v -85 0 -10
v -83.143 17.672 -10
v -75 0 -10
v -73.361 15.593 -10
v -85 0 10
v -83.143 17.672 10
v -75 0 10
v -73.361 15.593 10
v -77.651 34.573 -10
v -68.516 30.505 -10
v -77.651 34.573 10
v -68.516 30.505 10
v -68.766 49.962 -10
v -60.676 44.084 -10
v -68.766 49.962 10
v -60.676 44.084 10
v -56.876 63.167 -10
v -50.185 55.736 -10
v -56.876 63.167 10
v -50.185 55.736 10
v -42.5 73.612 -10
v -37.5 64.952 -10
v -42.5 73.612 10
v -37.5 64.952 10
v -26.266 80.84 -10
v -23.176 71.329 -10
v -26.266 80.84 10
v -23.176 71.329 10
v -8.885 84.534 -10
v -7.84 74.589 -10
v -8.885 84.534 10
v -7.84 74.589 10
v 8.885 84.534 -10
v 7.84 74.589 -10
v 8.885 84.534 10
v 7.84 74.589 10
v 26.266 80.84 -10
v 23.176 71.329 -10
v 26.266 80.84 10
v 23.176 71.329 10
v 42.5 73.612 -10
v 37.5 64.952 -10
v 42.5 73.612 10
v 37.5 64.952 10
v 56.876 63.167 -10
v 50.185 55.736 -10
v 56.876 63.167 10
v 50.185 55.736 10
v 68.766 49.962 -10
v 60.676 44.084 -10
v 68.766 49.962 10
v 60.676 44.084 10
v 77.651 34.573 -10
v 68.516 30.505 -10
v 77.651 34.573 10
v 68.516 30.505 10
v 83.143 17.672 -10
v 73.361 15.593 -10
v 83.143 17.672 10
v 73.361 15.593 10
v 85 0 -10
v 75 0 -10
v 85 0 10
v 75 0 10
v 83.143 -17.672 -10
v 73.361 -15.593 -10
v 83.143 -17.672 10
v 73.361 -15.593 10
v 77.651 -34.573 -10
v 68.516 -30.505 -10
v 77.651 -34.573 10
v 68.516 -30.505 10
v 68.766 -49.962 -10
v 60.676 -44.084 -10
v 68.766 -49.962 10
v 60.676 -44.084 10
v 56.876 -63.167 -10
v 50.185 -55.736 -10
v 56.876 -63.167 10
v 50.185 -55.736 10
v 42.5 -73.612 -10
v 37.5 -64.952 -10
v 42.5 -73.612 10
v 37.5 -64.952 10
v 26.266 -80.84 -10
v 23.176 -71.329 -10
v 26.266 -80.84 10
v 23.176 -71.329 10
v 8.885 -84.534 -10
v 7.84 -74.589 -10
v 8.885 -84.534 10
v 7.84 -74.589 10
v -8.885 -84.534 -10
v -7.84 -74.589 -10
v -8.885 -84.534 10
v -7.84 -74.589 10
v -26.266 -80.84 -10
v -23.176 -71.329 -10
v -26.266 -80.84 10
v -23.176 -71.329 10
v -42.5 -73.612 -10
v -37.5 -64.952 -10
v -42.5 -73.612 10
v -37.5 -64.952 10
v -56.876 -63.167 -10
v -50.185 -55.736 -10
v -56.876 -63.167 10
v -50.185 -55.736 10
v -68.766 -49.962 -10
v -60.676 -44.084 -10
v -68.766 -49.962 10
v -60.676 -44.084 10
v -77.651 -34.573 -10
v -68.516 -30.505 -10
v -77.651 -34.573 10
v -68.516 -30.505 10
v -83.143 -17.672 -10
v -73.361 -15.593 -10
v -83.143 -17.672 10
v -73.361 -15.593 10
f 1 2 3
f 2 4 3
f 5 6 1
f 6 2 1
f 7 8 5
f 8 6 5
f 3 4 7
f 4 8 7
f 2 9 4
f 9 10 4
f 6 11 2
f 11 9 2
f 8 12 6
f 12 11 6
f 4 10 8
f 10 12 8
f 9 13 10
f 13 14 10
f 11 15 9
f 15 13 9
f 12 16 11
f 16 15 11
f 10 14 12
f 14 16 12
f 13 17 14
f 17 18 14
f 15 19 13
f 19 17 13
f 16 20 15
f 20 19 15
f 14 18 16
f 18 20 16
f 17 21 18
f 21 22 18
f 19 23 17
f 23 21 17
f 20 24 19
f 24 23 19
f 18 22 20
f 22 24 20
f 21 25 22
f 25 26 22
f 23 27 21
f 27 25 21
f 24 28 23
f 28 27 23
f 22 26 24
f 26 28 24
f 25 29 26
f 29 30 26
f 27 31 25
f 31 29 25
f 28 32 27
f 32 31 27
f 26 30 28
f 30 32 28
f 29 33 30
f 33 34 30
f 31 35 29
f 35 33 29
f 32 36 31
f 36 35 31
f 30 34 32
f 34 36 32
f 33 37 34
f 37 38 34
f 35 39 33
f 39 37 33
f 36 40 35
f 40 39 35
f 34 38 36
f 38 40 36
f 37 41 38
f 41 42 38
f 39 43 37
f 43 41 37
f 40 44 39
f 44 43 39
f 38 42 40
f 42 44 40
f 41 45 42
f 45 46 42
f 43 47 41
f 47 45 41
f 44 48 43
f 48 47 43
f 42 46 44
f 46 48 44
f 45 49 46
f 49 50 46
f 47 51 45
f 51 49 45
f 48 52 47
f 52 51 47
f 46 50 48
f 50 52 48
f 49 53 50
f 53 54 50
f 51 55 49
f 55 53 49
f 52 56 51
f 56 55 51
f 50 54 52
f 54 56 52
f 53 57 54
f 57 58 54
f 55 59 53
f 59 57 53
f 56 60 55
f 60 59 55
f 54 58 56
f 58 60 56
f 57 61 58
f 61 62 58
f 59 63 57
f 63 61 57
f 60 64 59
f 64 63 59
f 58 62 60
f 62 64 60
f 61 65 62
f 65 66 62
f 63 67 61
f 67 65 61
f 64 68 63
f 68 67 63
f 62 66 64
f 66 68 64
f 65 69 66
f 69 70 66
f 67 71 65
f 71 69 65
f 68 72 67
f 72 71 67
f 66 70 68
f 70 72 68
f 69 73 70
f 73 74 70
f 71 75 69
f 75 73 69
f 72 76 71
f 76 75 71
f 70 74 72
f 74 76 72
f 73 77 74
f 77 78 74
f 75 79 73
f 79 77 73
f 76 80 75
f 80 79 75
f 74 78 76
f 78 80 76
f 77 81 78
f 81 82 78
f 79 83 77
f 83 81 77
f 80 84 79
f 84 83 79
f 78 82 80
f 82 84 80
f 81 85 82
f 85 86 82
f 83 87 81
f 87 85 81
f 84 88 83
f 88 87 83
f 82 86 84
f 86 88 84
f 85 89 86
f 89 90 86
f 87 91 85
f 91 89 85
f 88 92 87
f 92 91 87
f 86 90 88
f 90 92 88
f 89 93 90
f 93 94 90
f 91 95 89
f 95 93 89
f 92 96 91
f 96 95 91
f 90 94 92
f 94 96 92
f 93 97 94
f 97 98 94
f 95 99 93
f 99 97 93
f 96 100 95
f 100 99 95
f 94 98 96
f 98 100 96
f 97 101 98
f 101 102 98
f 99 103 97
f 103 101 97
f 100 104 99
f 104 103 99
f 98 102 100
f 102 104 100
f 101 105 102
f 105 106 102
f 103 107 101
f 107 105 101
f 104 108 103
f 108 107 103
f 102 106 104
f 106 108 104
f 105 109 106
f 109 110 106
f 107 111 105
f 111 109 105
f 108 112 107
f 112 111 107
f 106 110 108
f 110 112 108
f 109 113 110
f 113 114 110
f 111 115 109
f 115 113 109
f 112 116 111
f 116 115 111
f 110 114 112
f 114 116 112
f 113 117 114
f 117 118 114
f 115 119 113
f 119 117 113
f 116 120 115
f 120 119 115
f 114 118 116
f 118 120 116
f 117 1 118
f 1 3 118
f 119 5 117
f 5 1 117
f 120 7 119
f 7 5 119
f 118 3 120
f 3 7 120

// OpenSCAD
rotate_extrude(convexity=1, angle=360, $fa=12, $fn=0, $fs=2) {
  multmatrix([[1,0,0,80],[0,1,0,0],[0,0,1,0],[0,0,0,1]]) {
    square(size=[10, 20], center=true);
  }
}
